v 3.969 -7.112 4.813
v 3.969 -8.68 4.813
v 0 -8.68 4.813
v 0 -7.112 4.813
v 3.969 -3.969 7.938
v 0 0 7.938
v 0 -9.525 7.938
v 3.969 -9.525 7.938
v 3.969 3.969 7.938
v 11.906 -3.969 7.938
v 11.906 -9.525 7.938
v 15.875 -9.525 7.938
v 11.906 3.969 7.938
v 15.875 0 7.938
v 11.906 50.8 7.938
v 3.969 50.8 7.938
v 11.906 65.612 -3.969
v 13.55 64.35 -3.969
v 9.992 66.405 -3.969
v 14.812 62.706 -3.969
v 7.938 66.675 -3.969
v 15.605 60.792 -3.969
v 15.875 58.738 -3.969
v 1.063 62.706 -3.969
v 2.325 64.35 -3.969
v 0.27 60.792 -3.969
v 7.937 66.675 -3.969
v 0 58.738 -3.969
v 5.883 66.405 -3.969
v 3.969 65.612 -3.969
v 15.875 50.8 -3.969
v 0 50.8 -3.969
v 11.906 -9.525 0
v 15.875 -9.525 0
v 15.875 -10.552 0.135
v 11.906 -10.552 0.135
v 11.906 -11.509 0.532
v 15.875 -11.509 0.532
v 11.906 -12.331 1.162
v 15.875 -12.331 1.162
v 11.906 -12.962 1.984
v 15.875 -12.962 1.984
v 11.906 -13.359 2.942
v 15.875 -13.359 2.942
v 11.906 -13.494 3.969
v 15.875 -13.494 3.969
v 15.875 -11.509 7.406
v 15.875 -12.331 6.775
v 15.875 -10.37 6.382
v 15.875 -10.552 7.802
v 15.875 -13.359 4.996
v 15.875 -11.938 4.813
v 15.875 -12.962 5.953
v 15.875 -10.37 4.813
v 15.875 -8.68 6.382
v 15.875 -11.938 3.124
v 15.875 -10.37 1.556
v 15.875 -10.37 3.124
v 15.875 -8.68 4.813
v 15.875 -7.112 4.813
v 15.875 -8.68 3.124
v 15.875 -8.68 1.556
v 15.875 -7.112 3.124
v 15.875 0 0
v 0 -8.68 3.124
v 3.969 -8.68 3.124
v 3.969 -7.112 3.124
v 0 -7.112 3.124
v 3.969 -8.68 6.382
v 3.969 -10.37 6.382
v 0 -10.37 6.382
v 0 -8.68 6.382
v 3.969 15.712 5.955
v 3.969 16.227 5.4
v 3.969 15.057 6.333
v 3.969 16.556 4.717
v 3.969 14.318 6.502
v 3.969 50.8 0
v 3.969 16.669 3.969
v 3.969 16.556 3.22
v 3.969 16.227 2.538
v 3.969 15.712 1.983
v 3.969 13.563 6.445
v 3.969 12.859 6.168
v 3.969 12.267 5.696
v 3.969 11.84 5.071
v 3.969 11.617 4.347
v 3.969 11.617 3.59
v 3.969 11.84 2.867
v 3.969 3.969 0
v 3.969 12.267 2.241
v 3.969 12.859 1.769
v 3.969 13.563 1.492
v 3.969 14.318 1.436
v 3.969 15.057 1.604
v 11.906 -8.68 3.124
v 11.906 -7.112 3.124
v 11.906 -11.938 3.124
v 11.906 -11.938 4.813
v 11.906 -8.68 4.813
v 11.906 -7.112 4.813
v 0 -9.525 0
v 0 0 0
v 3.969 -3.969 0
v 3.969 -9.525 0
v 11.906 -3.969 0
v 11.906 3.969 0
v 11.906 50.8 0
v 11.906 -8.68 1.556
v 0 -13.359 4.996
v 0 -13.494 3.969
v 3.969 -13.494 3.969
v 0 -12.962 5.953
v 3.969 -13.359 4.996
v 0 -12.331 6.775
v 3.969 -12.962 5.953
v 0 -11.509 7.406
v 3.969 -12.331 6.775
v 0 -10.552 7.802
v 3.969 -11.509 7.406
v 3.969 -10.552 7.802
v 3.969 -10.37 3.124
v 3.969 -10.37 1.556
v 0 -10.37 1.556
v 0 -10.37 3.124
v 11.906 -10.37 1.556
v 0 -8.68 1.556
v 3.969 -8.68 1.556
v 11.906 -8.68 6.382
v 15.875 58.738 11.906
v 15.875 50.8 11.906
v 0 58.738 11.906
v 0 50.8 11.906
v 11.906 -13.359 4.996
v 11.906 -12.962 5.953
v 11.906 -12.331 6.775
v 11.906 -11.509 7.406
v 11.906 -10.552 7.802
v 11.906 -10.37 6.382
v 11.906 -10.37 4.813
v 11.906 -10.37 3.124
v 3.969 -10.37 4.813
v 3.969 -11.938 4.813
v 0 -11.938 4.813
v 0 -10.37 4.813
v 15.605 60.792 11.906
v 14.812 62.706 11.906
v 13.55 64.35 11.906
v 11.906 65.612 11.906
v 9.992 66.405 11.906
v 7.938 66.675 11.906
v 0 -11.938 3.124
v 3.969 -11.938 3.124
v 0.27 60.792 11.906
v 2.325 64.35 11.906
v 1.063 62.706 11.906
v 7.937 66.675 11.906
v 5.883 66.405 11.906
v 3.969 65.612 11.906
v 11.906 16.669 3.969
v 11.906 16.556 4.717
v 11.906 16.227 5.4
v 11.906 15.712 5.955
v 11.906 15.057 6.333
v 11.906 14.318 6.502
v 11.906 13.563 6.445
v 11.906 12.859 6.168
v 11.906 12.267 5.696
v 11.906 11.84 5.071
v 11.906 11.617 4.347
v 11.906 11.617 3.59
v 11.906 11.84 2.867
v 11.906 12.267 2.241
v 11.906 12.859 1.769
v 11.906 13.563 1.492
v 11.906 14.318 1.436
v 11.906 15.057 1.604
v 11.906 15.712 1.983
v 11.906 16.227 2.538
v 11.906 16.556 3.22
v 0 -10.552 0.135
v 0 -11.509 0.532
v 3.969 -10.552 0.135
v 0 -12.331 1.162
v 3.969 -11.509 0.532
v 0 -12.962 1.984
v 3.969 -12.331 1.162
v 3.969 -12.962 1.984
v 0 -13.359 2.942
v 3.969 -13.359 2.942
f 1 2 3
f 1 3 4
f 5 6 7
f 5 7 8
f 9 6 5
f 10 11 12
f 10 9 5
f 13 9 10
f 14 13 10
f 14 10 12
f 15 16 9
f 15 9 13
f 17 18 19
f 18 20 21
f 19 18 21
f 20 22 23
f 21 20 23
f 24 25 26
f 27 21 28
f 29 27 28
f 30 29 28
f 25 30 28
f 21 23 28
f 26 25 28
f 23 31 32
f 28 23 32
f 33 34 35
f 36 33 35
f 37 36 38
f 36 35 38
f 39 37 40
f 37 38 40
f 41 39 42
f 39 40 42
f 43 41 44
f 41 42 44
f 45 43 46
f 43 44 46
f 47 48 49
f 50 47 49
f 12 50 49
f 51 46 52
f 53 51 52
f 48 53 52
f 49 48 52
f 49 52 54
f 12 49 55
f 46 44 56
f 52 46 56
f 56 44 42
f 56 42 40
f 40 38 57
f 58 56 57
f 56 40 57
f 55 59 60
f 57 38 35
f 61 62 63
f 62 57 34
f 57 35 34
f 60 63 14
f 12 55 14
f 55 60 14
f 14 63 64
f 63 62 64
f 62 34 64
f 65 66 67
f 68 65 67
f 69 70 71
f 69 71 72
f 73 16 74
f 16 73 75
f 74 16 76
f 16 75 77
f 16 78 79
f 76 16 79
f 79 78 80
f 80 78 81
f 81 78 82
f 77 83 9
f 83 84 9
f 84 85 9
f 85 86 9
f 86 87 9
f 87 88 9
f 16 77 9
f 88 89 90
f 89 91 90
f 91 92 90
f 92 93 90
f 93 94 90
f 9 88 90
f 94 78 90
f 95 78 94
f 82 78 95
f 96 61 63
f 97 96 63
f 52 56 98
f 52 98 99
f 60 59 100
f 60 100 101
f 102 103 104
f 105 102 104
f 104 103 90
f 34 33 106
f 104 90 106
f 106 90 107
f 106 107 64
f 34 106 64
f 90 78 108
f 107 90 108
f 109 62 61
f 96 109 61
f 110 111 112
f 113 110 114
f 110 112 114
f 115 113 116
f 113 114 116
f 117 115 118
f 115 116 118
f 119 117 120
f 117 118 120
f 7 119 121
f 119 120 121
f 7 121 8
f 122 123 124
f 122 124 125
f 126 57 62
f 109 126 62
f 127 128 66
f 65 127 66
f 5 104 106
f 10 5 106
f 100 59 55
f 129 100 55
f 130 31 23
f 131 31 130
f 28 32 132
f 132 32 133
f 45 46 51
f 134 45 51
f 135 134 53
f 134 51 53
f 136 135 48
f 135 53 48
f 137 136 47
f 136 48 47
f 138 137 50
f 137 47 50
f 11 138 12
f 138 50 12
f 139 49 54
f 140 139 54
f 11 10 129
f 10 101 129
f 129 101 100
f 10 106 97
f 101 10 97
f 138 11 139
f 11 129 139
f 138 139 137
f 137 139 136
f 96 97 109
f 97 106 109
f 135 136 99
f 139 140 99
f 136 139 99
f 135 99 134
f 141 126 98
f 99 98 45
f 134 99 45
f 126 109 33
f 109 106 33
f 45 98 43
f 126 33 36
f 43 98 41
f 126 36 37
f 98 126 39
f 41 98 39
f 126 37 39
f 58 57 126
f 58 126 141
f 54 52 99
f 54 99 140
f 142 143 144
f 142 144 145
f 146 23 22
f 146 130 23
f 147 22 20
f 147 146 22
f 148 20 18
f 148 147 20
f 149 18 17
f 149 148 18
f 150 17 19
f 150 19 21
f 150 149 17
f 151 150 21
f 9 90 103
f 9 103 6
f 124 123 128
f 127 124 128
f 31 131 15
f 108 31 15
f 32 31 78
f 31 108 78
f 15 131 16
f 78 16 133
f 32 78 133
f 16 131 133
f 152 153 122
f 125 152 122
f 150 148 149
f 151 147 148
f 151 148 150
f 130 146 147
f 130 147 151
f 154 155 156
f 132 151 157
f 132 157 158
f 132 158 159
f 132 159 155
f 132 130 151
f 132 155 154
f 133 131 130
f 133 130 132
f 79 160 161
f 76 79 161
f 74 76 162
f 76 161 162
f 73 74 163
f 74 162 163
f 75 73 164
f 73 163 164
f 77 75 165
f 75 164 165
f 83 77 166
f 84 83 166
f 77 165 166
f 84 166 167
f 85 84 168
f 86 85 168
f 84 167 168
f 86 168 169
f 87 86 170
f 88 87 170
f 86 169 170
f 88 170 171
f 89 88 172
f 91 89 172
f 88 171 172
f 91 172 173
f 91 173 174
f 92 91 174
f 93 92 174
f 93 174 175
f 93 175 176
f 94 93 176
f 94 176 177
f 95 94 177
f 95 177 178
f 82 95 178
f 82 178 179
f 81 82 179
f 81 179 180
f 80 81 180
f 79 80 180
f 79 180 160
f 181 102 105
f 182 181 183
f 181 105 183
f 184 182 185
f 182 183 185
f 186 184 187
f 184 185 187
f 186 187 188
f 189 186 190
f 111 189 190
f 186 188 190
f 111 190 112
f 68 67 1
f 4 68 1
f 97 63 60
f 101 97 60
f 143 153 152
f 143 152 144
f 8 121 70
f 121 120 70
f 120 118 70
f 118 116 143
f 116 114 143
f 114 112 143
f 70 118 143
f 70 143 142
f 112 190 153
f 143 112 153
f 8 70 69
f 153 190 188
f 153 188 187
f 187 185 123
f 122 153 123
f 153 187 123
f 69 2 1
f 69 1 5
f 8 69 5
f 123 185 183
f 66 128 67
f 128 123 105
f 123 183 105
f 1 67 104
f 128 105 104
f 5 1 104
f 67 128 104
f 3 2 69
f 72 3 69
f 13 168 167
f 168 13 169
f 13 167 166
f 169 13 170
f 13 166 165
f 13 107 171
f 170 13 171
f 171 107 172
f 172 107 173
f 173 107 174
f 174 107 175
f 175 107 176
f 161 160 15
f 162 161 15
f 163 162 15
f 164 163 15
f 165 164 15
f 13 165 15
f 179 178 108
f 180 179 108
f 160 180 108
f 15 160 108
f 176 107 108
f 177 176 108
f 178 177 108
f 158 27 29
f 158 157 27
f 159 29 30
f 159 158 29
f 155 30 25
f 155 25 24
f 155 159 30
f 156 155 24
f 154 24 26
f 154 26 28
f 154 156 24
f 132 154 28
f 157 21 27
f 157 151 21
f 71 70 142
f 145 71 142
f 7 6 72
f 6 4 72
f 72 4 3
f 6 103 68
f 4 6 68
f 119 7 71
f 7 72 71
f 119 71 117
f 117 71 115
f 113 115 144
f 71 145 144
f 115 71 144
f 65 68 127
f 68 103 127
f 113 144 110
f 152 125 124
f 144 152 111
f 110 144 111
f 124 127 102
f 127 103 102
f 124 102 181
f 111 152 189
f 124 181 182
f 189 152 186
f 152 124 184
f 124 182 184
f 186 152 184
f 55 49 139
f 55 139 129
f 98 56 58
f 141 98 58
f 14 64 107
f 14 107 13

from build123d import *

# Parameters (mm, degrees)
F1_DEPTH = 7.9375
F2_R     = 2.54
F2_W     = 1.6891
F2_H     = 1.56845
F2_H_2   = 1.6891
F2_W_2   = 1.56845
F3_DEPTH = 15.875
F4_SIZE  = 3.96874
F5_W     = 15.875
F5_H     = 15.875
F6_DEPTH = 15.875
F7_R     = 7.93749


# Not quite as in the source:
# - a fillet or chamfer is up to 0.001 mm smaller than in the source, because OpenCascade refuses the exact size


with BuildPart() as f1:
    # F0 (on Top) → F1 (new body)
    with BuildSketch(Plane.XY):
        Polygon((3.96875, 0), (0, 0), (0, -13.49375), (3.96875, -13.49375), (3.96875, -3.96875), (11.90625, -3.96875), (11.90625, -13.49375), (15.875, -13.49375), (15.875, 0), (11.90625, 0), (11.90625, 50.8), (3.96875, 50.8), align=None)
    extrude(amount=F1_DEPTH)

    # F2 (on face) → F3 (cut, through all)
    with BuildSketch(Plane.YZ.offset(15.875)):
        with BuildLine():
            ThreePointArc((-9.525, 0), (-12.3313300378, 1.1624199622), (-13.49375, 3.96875))
            Line((-13.49375, 3.96875), (-13.49375, 0))
            Line((-13.49375, 0), (-9.525, 0))
        make_face()
        with BuildLine():
            ThreePointArc((-13.49375, 3.96875), (-12.3313300378, 6.7750800378), (-9.525, 7.9375))
            Line((-9.525, 7.9375), (-13.49375, 7.9375))
            Line((-13.49375, 7.9375), (-13.49375, 3.96875))
        make_face()
        with Locations((14.128559196, 3.96875)):
            Circle(F2_R)
        with Locations((-9.525, 5.597525)):
            Rectangle(F2_W, F2_H)
        with Locations((-9.525, 3.96875)):
            Rectangle(F2_W, F2_H_2)
        with Locations((-11.153775, 3.96875)):
            Rectangle(F2_W_2, F2_H_2)
        with Locations((-7.896225, 3.96875)):
            Rectangle(F2_W_2, F2_H_2)
        with Locations((-9.525, 2.339975)):
            Rectangle(F2_W, F2_H)
    extrude(amount=-F3_DEPTH, mode=Mode.SUBTRACT)

    # F4 (size 3.96875 in the source; OpenCascade refuses exactly that, so slightly less here)
    f4_edges = [f1.edges().sort_by_distance(p)[0] for p in [
        (11.90625, 0, 3.96875),
        (3.96875, 0, 3.96875),
    ]]
    chamfer(f4_edges, length=F4_SIZE)

    # F5 (on face) → F6 (join)
    with BuildSketch(Plane(origin=(0, 50.8, 0), x_dir=(-1, 0, 0), z_dir=(0, 1, 0))):
        with Locations((-7.9375, 3.96875)):
            Rectangle(F5_W, F5_H)
    extrude(amount=F6_DEPTH)

    # F7 (radius 7.9375 in the source; OpenCascade refuses exactly that, so slightly less here)
    f7_edges = [f1.edges().sort_by_distance(p)[0] for p in [
        (15.875, 66.675, 3.96875),
        (0, 66.675, 3.96875),
    ]]
    fillet(f7_edges, radius=F7_R)


solid = f1.part
